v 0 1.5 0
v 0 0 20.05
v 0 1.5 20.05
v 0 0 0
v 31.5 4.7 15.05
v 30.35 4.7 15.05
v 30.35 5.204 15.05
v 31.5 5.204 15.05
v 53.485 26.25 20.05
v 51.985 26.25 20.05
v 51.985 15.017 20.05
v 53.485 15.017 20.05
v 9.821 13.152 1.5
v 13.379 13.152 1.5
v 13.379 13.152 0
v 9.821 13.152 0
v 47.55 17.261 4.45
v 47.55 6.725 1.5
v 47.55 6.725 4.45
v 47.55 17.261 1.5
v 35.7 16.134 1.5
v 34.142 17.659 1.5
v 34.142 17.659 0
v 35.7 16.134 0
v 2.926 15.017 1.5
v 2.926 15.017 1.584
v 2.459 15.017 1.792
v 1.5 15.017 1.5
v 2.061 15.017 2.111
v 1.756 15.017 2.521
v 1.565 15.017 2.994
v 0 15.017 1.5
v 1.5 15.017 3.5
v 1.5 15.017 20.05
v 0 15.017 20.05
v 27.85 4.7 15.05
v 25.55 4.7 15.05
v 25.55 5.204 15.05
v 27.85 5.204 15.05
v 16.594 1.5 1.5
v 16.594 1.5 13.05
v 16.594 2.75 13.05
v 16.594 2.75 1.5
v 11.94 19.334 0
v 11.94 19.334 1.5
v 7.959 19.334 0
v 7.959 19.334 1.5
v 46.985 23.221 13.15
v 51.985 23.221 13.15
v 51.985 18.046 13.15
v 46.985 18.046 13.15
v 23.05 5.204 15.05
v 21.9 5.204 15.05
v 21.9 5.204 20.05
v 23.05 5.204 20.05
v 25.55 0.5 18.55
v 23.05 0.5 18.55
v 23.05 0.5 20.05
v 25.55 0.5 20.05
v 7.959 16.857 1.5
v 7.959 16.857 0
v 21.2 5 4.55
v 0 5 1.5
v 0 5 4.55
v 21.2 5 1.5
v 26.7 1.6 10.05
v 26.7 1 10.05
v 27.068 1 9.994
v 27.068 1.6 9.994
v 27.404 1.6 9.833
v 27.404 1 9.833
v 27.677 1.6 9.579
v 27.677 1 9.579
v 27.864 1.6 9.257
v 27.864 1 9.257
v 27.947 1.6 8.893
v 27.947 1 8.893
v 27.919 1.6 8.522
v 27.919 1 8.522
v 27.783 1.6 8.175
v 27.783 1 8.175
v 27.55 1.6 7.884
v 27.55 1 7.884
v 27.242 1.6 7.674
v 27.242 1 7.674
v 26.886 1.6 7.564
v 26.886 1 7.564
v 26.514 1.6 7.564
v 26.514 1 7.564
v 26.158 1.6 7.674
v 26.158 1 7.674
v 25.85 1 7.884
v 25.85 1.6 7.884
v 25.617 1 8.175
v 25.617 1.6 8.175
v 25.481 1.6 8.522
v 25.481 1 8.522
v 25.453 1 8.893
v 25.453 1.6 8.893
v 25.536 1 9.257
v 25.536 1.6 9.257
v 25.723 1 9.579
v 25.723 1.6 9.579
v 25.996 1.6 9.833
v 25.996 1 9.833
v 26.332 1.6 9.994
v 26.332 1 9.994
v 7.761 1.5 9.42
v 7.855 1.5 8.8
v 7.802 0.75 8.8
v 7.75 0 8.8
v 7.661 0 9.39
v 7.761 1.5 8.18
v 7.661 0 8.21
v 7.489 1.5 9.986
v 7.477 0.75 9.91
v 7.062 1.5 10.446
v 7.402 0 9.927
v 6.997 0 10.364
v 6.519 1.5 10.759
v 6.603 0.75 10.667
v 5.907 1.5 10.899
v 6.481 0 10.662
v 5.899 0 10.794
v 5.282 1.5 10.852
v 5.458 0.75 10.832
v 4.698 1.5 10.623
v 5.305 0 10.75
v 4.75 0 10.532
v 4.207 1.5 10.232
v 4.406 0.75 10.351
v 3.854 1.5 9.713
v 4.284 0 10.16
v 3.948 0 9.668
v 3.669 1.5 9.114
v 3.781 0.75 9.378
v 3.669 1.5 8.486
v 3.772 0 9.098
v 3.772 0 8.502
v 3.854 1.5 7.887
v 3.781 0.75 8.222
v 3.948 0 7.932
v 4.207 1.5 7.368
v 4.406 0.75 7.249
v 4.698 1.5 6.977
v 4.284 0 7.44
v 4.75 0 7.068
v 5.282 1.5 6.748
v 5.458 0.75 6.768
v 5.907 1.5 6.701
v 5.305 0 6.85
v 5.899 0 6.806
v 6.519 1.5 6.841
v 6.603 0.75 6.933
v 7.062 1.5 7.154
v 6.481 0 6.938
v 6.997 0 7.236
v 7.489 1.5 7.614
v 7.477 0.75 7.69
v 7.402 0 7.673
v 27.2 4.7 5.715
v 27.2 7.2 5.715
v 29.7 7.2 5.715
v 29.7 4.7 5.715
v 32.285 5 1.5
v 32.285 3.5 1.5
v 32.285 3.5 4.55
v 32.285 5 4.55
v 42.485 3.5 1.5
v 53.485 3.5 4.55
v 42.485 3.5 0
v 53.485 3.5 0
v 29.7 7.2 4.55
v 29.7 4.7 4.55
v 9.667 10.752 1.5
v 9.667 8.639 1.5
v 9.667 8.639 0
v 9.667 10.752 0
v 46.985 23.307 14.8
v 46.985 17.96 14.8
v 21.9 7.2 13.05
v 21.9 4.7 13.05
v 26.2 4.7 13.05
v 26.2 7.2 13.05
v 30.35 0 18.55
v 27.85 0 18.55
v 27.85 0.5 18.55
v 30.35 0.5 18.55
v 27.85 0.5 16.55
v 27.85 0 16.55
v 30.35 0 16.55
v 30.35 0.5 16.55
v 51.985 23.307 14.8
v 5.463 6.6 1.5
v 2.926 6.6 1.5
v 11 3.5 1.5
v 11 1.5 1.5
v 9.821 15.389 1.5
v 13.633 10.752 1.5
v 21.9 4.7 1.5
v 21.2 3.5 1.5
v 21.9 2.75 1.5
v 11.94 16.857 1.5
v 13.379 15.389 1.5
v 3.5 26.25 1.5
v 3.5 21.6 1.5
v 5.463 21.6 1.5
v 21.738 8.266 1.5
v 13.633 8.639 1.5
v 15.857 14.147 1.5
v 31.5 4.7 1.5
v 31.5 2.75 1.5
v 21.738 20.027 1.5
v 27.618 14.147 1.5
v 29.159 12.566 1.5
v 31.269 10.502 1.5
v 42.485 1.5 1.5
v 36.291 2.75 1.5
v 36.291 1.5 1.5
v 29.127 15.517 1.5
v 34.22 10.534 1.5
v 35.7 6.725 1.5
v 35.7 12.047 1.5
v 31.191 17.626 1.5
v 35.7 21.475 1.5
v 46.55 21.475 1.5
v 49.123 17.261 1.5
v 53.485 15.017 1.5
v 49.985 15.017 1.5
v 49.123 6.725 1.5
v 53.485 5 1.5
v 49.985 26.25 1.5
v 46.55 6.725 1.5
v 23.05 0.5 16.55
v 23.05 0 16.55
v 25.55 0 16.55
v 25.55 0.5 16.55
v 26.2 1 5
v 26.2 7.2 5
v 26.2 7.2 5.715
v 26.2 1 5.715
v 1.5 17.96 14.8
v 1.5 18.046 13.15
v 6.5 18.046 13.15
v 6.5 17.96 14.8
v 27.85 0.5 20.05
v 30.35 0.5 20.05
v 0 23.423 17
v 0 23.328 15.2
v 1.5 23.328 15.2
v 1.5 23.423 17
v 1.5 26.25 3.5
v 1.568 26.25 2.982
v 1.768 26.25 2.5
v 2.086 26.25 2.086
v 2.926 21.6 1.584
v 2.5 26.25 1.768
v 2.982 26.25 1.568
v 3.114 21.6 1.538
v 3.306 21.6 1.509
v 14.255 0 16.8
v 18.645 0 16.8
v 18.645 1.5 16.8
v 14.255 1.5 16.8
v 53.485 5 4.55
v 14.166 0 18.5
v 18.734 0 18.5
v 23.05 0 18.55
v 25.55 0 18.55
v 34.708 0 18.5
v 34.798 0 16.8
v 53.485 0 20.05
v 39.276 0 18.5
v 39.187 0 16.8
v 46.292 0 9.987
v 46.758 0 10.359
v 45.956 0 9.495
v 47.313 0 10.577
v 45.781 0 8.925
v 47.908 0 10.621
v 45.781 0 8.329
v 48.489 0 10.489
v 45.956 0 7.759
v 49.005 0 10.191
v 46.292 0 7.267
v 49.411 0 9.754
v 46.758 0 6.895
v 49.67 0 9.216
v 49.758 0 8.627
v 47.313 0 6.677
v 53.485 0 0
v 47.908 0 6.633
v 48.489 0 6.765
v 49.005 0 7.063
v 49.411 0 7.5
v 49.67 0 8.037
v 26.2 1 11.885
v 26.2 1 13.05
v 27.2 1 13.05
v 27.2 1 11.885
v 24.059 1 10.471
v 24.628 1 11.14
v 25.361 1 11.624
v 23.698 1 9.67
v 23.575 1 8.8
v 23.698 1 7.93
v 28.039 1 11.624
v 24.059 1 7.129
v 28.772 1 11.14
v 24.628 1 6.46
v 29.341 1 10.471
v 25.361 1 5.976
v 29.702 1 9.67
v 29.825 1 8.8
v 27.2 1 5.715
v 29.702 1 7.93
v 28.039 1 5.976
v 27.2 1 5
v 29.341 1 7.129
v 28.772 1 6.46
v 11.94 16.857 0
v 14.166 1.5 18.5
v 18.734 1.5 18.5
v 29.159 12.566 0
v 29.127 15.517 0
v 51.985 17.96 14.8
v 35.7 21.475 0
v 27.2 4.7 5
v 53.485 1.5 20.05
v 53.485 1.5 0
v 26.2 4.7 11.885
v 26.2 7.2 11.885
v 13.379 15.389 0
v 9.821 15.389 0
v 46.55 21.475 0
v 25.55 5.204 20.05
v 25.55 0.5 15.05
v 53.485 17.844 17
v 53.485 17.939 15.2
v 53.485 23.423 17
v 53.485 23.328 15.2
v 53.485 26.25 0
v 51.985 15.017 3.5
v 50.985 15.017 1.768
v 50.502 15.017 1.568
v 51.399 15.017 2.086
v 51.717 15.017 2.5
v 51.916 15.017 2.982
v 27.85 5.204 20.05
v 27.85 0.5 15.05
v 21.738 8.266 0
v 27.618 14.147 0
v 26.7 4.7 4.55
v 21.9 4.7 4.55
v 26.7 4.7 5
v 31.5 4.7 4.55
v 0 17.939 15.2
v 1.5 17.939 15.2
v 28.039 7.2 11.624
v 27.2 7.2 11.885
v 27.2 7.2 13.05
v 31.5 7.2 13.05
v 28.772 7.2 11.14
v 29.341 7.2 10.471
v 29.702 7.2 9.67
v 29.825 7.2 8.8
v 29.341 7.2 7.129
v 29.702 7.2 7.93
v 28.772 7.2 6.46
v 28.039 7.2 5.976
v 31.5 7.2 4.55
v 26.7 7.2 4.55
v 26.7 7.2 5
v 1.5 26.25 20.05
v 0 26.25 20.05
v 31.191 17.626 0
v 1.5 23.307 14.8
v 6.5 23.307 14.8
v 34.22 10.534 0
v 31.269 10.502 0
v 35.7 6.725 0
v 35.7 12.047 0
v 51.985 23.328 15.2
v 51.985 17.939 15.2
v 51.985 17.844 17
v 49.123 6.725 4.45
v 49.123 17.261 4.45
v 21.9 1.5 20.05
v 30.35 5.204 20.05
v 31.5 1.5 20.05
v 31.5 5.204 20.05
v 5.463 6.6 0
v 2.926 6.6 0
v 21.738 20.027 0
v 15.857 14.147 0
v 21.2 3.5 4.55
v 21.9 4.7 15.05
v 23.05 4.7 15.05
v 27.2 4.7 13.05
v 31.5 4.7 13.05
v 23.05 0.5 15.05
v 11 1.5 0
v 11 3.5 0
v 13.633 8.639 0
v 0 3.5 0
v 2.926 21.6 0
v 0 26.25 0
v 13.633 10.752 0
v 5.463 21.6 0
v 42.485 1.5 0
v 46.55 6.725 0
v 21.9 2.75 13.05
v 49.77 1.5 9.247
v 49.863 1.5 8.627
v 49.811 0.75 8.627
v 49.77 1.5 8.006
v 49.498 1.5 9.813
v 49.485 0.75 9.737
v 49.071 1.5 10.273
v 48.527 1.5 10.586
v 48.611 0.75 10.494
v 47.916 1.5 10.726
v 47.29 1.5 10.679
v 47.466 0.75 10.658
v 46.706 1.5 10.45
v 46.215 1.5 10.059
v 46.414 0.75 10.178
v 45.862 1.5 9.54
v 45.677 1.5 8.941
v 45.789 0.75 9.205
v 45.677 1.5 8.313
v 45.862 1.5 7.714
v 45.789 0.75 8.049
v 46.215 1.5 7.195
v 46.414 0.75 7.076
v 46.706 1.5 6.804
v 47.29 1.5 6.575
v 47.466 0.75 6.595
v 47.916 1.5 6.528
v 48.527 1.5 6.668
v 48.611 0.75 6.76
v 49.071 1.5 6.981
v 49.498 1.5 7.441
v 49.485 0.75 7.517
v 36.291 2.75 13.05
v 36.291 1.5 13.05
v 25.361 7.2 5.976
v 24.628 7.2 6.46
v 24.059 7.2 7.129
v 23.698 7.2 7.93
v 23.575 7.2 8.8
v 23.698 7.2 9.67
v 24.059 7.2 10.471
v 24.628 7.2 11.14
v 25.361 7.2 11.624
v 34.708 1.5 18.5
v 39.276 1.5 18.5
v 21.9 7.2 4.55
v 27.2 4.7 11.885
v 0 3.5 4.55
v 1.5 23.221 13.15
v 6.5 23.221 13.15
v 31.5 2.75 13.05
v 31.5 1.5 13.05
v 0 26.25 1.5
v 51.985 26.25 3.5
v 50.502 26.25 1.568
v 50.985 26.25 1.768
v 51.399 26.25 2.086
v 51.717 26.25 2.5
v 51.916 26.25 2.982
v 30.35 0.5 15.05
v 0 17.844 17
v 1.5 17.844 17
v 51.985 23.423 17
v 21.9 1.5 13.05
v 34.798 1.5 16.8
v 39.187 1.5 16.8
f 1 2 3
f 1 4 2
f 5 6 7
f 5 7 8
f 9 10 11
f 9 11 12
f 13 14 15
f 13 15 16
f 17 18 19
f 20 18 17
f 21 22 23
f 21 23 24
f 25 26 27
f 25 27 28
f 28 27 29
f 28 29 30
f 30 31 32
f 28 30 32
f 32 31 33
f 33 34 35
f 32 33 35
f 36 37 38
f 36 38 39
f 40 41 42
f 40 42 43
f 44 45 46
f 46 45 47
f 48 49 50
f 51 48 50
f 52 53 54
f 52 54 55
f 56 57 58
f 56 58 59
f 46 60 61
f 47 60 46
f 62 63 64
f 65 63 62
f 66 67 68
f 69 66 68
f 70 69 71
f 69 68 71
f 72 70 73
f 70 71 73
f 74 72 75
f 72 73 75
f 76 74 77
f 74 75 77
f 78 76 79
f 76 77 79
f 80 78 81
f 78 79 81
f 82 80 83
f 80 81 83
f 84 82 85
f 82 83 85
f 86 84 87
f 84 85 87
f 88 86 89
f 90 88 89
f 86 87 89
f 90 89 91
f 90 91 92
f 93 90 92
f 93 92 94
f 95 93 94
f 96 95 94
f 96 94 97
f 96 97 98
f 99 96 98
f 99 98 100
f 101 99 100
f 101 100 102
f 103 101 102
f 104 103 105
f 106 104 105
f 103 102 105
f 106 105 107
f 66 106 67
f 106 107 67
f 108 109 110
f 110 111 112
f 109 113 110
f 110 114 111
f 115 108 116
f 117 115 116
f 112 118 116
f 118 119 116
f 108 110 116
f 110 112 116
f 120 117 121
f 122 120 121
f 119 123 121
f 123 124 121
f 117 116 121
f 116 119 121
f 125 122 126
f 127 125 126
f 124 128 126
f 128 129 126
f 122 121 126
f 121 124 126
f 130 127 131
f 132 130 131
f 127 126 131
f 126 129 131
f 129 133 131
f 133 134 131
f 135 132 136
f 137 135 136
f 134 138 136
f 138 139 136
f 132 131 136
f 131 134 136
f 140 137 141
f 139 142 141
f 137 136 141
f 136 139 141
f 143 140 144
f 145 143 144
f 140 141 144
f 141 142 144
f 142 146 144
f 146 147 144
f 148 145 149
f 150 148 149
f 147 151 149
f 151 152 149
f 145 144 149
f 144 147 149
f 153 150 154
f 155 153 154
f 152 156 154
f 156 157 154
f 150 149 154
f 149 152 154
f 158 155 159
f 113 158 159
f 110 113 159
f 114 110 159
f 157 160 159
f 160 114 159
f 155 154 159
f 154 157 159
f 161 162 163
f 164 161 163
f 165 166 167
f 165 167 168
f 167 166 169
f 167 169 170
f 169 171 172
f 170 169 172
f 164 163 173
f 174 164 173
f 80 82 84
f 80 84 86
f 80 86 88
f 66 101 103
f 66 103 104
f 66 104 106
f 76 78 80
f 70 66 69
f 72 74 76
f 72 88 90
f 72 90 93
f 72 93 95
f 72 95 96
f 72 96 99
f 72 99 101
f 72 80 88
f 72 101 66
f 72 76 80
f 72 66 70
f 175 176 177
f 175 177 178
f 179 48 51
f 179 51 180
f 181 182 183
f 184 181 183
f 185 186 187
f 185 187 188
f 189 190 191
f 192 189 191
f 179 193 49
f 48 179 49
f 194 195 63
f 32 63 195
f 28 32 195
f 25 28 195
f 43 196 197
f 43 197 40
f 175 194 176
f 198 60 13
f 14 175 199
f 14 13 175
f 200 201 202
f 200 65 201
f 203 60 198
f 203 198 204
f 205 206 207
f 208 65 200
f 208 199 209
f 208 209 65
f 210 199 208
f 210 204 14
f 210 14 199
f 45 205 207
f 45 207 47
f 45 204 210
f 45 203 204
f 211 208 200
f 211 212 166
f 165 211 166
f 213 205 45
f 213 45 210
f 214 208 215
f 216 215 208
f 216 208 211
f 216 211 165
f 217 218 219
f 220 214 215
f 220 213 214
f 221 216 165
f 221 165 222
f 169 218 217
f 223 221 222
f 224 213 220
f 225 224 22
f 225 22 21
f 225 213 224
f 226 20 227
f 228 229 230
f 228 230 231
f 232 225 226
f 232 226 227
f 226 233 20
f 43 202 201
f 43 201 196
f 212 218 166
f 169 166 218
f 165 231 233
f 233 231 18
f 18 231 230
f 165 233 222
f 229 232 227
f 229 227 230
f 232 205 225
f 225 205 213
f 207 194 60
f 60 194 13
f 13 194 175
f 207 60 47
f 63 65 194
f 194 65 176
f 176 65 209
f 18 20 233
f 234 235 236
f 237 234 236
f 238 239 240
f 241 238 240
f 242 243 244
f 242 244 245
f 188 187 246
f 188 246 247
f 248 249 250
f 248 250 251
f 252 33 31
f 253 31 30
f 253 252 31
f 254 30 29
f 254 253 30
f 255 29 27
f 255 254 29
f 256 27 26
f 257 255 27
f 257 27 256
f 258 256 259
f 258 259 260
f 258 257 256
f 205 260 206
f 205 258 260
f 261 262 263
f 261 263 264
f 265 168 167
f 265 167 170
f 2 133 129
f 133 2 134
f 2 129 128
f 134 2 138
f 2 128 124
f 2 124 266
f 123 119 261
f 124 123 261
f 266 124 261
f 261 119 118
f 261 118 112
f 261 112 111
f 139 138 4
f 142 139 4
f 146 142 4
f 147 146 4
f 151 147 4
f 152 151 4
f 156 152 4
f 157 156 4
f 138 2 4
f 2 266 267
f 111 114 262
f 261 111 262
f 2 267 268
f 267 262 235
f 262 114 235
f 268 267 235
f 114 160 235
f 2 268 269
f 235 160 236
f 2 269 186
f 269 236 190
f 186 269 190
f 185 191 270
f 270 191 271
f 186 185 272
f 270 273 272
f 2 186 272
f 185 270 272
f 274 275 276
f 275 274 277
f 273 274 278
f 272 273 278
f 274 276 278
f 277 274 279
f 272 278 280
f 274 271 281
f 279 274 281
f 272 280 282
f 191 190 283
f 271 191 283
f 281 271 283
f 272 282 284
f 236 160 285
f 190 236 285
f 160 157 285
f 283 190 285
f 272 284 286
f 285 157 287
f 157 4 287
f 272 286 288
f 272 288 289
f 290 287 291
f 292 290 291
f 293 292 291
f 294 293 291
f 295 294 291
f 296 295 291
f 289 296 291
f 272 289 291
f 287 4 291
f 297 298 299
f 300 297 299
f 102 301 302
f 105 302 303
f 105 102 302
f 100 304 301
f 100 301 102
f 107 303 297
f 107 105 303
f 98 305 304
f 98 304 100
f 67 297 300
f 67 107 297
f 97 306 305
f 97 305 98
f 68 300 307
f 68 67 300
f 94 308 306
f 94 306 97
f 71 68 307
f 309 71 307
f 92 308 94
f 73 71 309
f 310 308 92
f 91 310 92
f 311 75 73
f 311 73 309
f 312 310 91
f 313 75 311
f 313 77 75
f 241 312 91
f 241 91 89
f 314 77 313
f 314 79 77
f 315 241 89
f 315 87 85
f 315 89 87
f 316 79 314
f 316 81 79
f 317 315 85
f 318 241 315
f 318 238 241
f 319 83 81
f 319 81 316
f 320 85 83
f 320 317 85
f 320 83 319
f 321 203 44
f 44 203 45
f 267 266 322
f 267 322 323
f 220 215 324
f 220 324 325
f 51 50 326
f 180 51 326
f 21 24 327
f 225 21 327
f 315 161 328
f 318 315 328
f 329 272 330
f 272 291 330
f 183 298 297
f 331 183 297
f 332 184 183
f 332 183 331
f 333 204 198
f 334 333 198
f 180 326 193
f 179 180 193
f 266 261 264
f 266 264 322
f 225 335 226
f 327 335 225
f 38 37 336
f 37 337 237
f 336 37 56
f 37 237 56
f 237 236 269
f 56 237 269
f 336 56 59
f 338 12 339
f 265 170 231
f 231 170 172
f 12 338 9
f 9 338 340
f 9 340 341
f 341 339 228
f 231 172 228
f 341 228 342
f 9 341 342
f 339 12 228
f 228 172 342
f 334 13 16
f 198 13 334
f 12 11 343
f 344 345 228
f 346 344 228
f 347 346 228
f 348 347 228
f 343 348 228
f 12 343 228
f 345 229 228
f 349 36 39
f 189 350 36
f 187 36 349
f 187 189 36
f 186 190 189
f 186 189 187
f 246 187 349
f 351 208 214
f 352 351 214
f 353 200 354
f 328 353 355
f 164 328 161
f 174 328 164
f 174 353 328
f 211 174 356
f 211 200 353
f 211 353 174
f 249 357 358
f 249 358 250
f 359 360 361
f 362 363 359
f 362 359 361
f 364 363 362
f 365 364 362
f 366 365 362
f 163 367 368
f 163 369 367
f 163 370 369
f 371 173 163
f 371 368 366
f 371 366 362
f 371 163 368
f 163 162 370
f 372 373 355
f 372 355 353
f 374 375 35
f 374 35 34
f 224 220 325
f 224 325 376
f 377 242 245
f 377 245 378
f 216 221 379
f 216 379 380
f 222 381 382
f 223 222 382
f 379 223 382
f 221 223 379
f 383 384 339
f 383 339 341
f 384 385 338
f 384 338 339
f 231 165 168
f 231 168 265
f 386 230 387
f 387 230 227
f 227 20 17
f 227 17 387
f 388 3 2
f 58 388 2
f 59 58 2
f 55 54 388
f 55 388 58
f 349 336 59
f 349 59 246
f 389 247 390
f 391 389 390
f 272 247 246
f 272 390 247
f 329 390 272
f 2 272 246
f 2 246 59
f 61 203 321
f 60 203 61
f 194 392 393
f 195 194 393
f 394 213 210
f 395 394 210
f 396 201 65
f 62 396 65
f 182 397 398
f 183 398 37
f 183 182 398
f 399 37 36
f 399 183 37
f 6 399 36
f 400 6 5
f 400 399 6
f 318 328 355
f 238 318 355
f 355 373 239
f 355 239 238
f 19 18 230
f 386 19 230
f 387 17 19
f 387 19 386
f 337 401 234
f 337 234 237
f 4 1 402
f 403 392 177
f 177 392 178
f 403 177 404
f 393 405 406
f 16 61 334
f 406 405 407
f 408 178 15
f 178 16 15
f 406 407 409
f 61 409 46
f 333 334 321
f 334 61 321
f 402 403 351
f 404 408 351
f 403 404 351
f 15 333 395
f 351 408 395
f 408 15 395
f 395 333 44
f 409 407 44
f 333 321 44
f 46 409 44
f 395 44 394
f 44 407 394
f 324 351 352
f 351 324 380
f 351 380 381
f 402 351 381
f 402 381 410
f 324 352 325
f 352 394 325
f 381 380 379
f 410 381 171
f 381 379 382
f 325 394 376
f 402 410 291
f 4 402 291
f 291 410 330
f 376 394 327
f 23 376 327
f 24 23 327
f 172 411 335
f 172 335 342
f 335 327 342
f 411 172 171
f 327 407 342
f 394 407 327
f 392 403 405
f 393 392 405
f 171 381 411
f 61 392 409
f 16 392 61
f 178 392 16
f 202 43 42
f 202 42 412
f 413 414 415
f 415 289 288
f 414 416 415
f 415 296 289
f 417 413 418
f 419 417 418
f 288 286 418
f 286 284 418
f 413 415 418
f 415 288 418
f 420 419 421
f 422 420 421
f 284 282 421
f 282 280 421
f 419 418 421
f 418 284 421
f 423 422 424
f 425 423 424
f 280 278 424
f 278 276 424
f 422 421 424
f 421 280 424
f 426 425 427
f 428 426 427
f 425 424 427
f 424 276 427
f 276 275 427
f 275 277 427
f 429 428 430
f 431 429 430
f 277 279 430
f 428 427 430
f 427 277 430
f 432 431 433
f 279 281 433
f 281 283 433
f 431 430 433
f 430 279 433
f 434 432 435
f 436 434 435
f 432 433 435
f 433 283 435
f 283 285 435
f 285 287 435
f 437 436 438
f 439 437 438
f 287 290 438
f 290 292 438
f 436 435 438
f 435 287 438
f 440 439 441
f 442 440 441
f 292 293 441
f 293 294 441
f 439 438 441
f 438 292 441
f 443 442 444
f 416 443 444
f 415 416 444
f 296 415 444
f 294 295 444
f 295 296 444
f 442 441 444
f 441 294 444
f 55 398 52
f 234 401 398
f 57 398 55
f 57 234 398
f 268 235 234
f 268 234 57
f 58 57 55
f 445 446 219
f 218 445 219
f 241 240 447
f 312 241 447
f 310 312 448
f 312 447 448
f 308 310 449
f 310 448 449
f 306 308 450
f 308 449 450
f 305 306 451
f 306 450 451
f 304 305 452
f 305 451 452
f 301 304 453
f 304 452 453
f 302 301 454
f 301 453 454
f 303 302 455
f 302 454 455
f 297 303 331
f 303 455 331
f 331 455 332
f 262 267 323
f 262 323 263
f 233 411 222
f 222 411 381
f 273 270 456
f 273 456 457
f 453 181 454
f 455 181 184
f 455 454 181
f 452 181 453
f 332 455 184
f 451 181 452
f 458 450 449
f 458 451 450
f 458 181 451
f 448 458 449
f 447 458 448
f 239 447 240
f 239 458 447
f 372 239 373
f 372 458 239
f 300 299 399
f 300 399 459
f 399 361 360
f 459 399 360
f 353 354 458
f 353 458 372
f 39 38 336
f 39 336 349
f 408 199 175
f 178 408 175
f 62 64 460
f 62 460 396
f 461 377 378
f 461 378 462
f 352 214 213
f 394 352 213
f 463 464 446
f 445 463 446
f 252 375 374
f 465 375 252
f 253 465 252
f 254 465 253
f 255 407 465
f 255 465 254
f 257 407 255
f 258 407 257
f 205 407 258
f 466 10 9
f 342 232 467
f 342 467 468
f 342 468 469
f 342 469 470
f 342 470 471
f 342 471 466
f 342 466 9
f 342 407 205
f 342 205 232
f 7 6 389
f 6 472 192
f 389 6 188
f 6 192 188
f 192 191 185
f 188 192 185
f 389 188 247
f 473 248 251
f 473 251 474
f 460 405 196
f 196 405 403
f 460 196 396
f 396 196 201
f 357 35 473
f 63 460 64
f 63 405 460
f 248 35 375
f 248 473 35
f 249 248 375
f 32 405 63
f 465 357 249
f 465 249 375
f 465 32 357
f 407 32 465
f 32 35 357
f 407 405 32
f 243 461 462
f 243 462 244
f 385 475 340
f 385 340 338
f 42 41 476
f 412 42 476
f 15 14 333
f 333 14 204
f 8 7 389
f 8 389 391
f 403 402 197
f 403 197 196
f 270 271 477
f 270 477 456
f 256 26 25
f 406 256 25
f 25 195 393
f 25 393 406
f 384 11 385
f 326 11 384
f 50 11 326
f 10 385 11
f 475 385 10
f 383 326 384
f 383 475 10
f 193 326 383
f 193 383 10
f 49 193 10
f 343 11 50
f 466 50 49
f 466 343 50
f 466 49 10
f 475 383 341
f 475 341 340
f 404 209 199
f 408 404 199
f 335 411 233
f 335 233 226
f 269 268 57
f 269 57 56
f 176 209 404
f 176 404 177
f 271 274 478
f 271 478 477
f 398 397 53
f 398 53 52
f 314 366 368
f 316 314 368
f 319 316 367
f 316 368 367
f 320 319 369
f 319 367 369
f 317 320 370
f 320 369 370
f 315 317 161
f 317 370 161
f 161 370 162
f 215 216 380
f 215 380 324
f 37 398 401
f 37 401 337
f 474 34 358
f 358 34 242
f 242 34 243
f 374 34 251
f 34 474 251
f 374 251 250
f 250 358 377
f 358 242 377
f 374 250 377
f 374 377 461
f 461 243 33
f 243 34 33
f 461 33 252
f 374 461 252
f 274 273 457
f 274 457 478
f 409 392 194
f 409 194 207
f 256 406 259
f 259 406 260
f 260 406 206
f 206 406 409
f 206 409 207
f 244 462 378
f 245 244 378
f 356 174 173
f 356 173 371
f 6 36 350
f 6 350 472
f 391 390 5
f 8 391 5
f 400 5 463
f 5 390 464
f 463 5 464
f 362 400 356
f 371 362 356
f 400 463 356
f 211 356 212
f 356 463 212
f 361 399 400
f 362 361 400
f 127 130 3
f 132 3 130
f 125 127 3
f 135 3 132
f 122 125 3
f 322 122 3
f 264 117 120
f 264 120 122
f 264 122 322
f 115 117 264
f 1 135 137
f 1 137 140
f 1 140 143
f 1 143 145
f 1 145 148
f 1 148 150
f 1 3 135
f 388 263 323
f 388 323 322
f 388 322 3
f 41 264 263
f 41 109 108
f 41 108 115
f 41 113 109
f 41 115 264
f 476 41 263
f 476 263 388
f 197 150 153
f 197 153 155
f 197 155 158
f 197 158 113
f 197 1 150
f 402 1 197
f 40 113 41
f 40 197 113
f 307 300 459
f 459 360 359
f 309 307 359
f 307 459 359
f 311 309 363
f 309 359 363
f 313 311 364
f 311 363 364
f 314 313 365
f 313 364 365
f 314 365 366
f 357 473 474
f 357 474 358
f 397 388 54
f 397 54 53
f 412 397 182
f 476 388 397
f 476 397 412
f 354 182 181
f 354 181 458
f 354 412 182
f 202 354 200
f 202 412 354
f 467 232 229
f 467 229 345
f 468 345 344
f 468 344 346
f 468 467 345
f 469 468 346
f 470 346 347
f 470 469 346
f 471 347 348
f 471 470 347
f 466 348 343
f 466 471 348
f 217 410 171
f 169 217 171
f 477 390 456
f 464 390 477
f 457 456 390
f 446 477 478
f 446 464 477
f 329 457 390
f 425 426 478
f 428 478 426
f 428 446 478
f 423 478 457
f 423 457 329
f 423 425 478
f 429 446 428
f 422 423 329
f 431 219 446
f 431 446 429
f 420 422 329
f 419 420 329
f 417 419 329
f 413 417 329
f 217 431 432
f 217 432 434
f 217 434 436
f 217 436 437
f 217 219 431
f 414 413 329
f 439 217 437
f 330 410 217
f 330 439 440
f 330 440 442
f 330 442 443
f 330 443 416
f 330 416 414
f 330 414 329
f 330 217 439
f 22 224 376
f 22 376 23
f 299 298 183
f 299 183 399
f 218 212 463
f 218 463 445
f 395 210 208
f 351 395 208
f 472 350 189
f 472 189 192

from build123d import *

# Parameters (mm, degrees)
SKETCH1_W                              = 53.48460998
SKETCH1_H                              = 26.25
FRONT_SIDE_MAIN_DEPTH                  = 1.5
RESET_HOLE_DEPTH                       = 3.75
SKETCH15_W                             = 3.966010581
SKETCH15_H                             = 2.112155191
SKETCH15_W_2                           = 3.557190409
SKETCH15_H_2                           = 2.236587576
SKETCH15_W_3                           = 3.981127105
SKETCH15_H_3                           = 2.476855865
COMPONENT_HOLES_DEPTH                  = 3.75
SKETCH16_W                             = 10.85
SKETCH16_H                             = 14.75
MICROPHONE_HOLE_DEPTH                  = 1.5
SKETCH24_W                             = 1.5
SKETCH24_H                             = 11.233042059
RIGHT_SIDE_TOP_DEPTH                   = 18.55
SNAP_GROOVE_RIGHT_DEPTH                = 1.5
SKETCH26_W                             = 1.5
SKETCH26_H                             = 11.23304206
LEFT_SIDE_TOP_DEPTH                    = 18.55
SNAP_START                             = 51.98460998
SNAP_GROOVE_LEFT_DEPTH                 = 1.5
SKETCH20_W                             = 53.48460998
SKETCH20_H                             = 1.5
BOTTOM_BASE_DEPTH                      = 18.55
SERVO_START                            = -1.5
SKETCH18_W                             = 9.6
SKETCH18_H                             = 3.2
SERVO_SEPERATOR_BOTTOM_DEPTH           = 20.05
SKETCH34_W                             = 2.537171882
SKETCH34_H                             = 15
PROGRAMMING_HOLE_DEPTH                 = 3.75
SKETCH38_W                             = 9.6
SKETCH38_H                             = 5
BACK_BATTERY_HOLDER_BOTTOM_DEPTH       = 0.50445794
SKETCH40_R                             = 2
SERVO_ARM_HOLES_BOTTOM_DEPTH           = 1.5
SERVO_ARM_HOLES_BOTTOM_DRAFT           = 4
SERVO_ARM_HOLES_BOTTOM_PROFILE_2_DEPTH = 1.5
SERVO_ARM_HOLES_BOTTOM_PROFILE_2_DRAFT = 4
SKETCH47_W                             = 11
SKETCH47_H                             = 2
SOLAR_ARM_HOLES_FRONT_DEPTH            = 1.5
FILLET1_R                              = 2
SKETCH48_W                             = 9.6
SKETCH48_H                             = 8.5
SERVO_TALLER_SEPERATOR_BOTTOM_DEPTH    = 2.5
SKETCH49_W                             = 1.573389805
SKETCH49_H                             = 10.535992885
SERVO_2_CASE_SPACER_FRONT_DEPTH        = 2.95
SKETCH51_W                             = 4.791370676
SKETCH51_H                             = 11.55
SKETCH51_W_2                           = 5.306259021
SERVO_LIFTERS_BOTTOM_DEPTH             = 1.25
SKETCH52_W                             = 21.2
SKETCH52_H                             = 1.5
SERVO_UNDER_SUPPORT_DEPTH              = 3.05
SERVO_TOP_SUPPORT_RIGHT_DEPTH          = 5
SERVO_TOP_SUPPORT_LEFT_DEPTH           = 5
SNAP_GROOVE_BOTTOM_RIGHT_DEPTH         = 1.5
SNAP_GROOVE_BOTTOM_LEFT_DEPTH          = 1.5
VIBRATION_MOTOR_AND_WIRE_HOLES_DEPTH   = 6.2
SKETCH57_W                             = 3
SKETCH57_H                             = 1.16525933
SKETCH57_W_2                           = 1
SKETCH57_H_2                           = 1.45
VIBRATION_WIRE_ROUTING_HOLES_DEPTH     = 2.5
SKETCH60_W                             = 2.5
SKETCH60_H                             = 5
COPPER_HOLES_DEPTH                     = 4.70445794
SKETCH61_W                             = 2.5
SKETCH61_H                             = 2
CUT_EXTRUDE5_DEPTH                     = 0.5
SKETCH62_R                             = 1.25
BOSS_EXTRUDE1_DEPTH                    = 0.6
CUT_EXTRUDE7_START                     = -3.7
CUT_EXTRUDE7_DEPTH                     = 3.7


# Read off the part's stored shape, not the designer's step: Snap Groove - Right, Snap Groove - Left, Snap Groove - Bottom Right, Snap Groove - Bottom Left, Cut-Extrude7
with BuildPart() as part:
    # Sketch1 → Front Side - Main (new body)
    with BuildSketch(Plane.XY):
        with Locations((26.74230499, 13.125)):
            Rectangle(SKETCH1_W, SKETCH1_H)
    extrude(amount=FRONT_SIDE_MAIN_DEPTH)

    # Reset Hole Sketch → Reset Hole (cut)
    with BuildSketch(Plane(origin=(0, 0, 3.75), x_dir=(-1, 0, 0), z_dir=(0, 0, -1))):
        Polygon((-31.190735744, 17.626168756), (-34.141748042, 17.658585925), (-36.251351249, 15.594827519), (-36.283768419, 12.643815222), (-34.220010013, 10.534212015), (-31.268997715, 10.501794845), (-29.159394508, 12.565553251), (-29.126977338, 15.516565548), align=None)
    extrude(amount=RESET_HOLE_DEPTH, mode=Mode.SUBTRACT)

    # Sketch15 → Component Holes (cut)
    with BuildSketch(Plane(origin=(0, 0, 3.75), x_dir=(-1, 0, 0), z_dir=(0, 0, -1))):
        Polygon((-21.737702993, 20.027277789), (-15.857179586, 14.146754382), (-21.737702993, 8.266230975), (-27.6182264, 14.146754382), align=None)
        with Locations((-11.649935563, 9.695513201)):
            Rectangle(SKETCH15_W, SKETCH15_H)
        with Locations((-11.599935563, 14.270513201)):
            Rectangle(SKETCH15_W_2, SKETCH15_H_2)
        with Locations((-9.949935563, 18.095513201)):
            Rectangle(SKETCH15_W_3, SKETCH15_H_3)
    extrude(amount=COMPONENT_HOLES_DEPTH, mode=Mode.SUBTRACT)

    # Sketch16 → Microphone Hole (cut)
    with BuildSketch(Plane(origin=(0, 0, 0), x_dir=(-1, 0, 0), z_dir=(0, 0, -1))):
        with Locations((-41.124935562, 14.1)):
            Rectangle(SKETCH16_W, SKETCH16_H)
    extrude(amount=-MICROPHONE_HOLE_DEPTH, mode=Mode.SUBTRACT)

    # Sketch24 → Right Side - Top (add)
    with BuildSketch(Plane.XY.offset(1.5)):
        with Locations((0.75, 20.633478971)):
            Rectangle(SKETCH24_W, SKETCH24_H)
    extrude(amount=RIGHT_SIDE_TOP_DEPTH)

    # Snap Groove - Right outline → Snap Groove - Right (cut)
    with BuildSketch(Plane.YZ):
        Polygon((17.938719749, 15.2), (23.328238193, 15.2), (23.422572195, 17), (17.844385746, 17), align=None)
    extrude(amount=SNAP_GROOVE_RIGHT_DEPTH, mode=Mode.SUBTRACT)

    # Sketch26 → Left Side - Top (add)
    with BuildSketch(Plane.XY.offset(1.5)):
        with Locations((52.73460998, 20.63347897)):
            Rectangle(SKETCH26_W, SKETCH26_H)
    extrude(amount=LEFT_SIDE_TOP_DEPTH)

    # Snap Groove - Left outline → Snap Groove - Left (cut)
    with BuildSketch(Plane.YZ.offset(SNAP_START)):
        Polygon((17.938719748, 15.2), (23.328238192, 15.2), (23.422572195, 17), (17.844385746, 17), align=None)
    extrude(amount=SNAP_GROOVE_LEFT_DEPTH, mode=Mode.SUBTRACT)

    # Sketch18 → Servo Seperator - Bottom (add)
    with BuildSketch(Plane.XY.offset(1.5).offset(SERVO_START)):
        with Locations((26.7, 3.1)):
            Rectangle(SKETCH18_W, SKETCH18_H)
    extrude(amount=SERVO_SEPERATOR_BOTTOM_DEPTH)

    # Sketch34 → Programming Hole (cut)
    with BuildSketch(Plane(origin=(0, 0, 0), x_dir=(-1, 0, 0), z_dir=(0, 0, -1))):
        with Locations((-4.194161079, 14.100049249)):
            Rectangle(SKETCH34_W, SKETCH34_H)
    extrude(amount=-PROGRAMMING_HOLE_DEPTH, mode=Mode.SUBTRACT)

    # Sketch38 → Back Battery Holder - Bottom (add)
    with BuildSketch(Plane(origin=(0, 4.7, 0), x_dir=(1, 0, 0), z_dir=(0, 1, 0))):
        with Locations((26.7, -17.55)):
            Rectangle(SKETCH38_W, SKETCH38_H)
    extrude(amount=BACK_BATTERY_HOLDER_BOTTOM_DEPTH)

    # Sketch47 → Solar Arm Holes - Front (cut)
    with BuildSketch(Plane(origin=(0, 0, 0), x_dir=(-1, 0, 0), z_dir=(0, 0, -1))):
        with Locations((-47.98460998, 2.5)):
            Rectangle(SKETCH47_W, SKETCH47_H)
        with Locations((-5.5, 2.5)):
            Rectangle(SKETCH47_W, SKETCH47_H)
    extrude(amount=-SOLAR_ARM_HOLES_FRONT_DEPTH, mode=Mode.SUBTRACT)

    # Fillet1
    # the kernel refuses this fillet: 2 mm, written as the material it adds along each edge
    with BuildSketch(Plane(origin=(1.5, 26.25, 1.5), x_dir=(1, 0, 0), z_dir=(0, -1, 0))) as fillet1_piece_1_section:
        with BuildLine():
            CenterArc((FILLET1_R, FILLET1_R), FILLET1_R, 180, 90)
            Line((0, FILLET1_R), (0, 0))
            Line((0, 0), (FILLET1_R, 0))
        make_face()
    fillet1_piece_1 = extrude(amount=11.233042059, mode=Mode.PRIVATE)
    fillet1_piece_1 = split(fillet1_piece_1, bisect_by=Plane(origin=(3.153594052, 21.600049249, 1.498546269), z_dir=(0, 1, 0)), keep=Keep.TOP, mode=Mode.PRIVATE)
    fillet1_piece_1 = split(fillet1_piece_1, bisect_by=Plane(origin=(2.925575138, 23.925024625, 1.498546269), z_dir=(1, 0, 0)), keep=Keep.TOP, mode=Mode.PRIVATE)
    add(fillet1_piece_1)
    with BuildSketch(Plane(origin=(1.5, 26.25, 1.5), x_dir=(1, 0, 0), z_dir=(0, -1, 0))) as fillet1_piece_2_section:
        with BuildLine():
            CenterArc((FILLET1_R, FILLET1_R), FILLET1_R, 180, 90)
            Line((0, FILLET1_R), (0, 0))
            Line((0, 0), (FILLET1_R, 0))
        make_face()
    fillet1_piece_2 = extrude(amount=11.233042059, mode=Mode.PRIVATE)
    fillet1_piece_2 = split(fillet1_piece_2, bisect_by=Plane(origin=(1.90508607, 21.600049249, 1.970835912), z_dir=(0, 1, 0)), keep=Keep.TOP, mode=Mode.PRIVATE)
    fillet1_piece_2 = split(fillet1_piece_2, bisect_by=Plane(origin=(2.925575138, 23.925024625, 1.970835912), z_dir=(-1, 0, 0)), keep=Keep.TOP, mode=Mode.PRIVATE)
    add(fillet1_piece_2)
    with BuildSketch(Plane(origin=(1.5, 26.25, 1.5), x_dir=(1, 0, 0), z_dir=(0, -1, 0))) as fillet1_piece_3_section:
        with BuildLine():
            CenterArc((FILLET1_R, FILLET1_R), FILLET1_R, 180, 90)
            Line((0, FILLET1_R), (0, 0))
            Line((0, 0), (FILLET1_R, 0))
        make_face()
    fillet1_piece_3 = extrude(amount=11.233042059, mode=Mode.PRIVATE)
    fillet1_piece_3 = split(fillet1_piece_3, bisect_by=Plane(origin=(1.90508607, 21.600049249, 1.970835912), z_dir=(0, -1, 0)), keep=Keep.TOP, mode=Mode.PRIVATE)
    fillet1_piece_3 = split(fillet1_piece_3, bisect_by=Plane(origin=(2.925575138, 18.308503595, 1.970835912), z_dir=(-1, 0, 0)), keep=Keep.TOP, mode=Mode.PRIVATE)
    add(fillet1_piece_3)
    with BuildSketch(Plane(origin=(51.98460998, 26.25, 1.5), x_dir=(-1, 0, 0), z_dir=(0, -1, 0))) as fillet1_piece_4:
        with BuildLine():
            CenterArc((FILLET1_R, -FILLET1_R), FILLET1_R, 90, 90)
            Line((0, -FILLET1_R), (0, 0))
            Line((0, 0), (FILLET1_R, 0))
        make_face()
    extrude(amount=11.23304206)

    # Sketch48 → Servo Taller Seperator - Bottom (add)
    with BuildSketch(Plane(origin=(0, 4.7, 0), x_dir=(1, 0, 0), z_dir=(0, 1, 0))):
        with Locations((26.7, -8.8)):
            Rectangle(SKETCH48_W, SKETCH48_H)
    extrude(amount=SERVO_TALLER_SEPERATOR_BOTTOM_DEPTH)

    # Sketch49 → Servo 2 Case Spacer - Front (add)
    with BuildSketch(Plane.XY.offset(1.5)):
        with Locations((48.336630465, 11.992996443)):
            Rectangle(SKETCH49_W, SKETCH49_H)
    extrude(amount=SERVO_2_CASE_SPACER_FRONT_DEPTH)

    # Sketch51 → Servo Lifters - Bottom (add)
    with BuildSketch(Plane(origin=(0, 1.5, 0), x_dir=(1, 0, 0), z_dir=(0, 1, 0))):
        with Locations((33.895685338, -7.275)):
            Rectangle(SKETCH51_W, SKETCH51_H)
        with Locations((19.24687049, -7.275)):
            Rectangle(SKETCH51_W_2, SKETCH51_H)
    extrude(amount=SERVO_LIFTERS_BOTTOM_DEPTH)

    # Sketch52 → Servo Under Support (add)
    with BuildSketch(Plane.XY.offset(1.5)):
        with Locations((10.6, 4.25)):
            Rectangle(SKETCH52_W, SKETCH52_H)
        with Locations((42.88460998, 4.25)):
            Rectangle(SKETCH52_W, SKETCH52_H)
    extrude(amount=SERVO_UNDER_SUPPORT_DEPTH)

    # Sketch53 → Servo Top Support - Right (add)
    with BuildSketch(Plane(origin=(1.5, 0, 0), x_dir=(0, 0, -1), z_dir=(1, 0, 0))):
        Polygon((-14.8, 23.307275081), (-13.15, 23.220802245), (-13.15, 18.046155696), (-14.8, 17.95968286), align=None)
    extrude(amount=SERVO_TOP_SUPPORT_RIGHT_DEPTH)

    # Sketch55 → Servo Top Support - Left (add)
    with BuildSketch(Plane.ZY.offset(-51.98460998)):
        Polygon((14.8, 17.95968286), (14.8, 23.307275081), (13.15, 23.220802245), (13.15, 18.046155696), align=None)
    extrude(amount=SERVO_TOP_SUPPORT_LEFT_DEPTH)


with BuildPart() as body_2:
    # Sketch20 → Bottom Base (new body)
    with BuildSketch(Plane.XY.offset(1.5)):
        with Locations((26.74230499, 0.75)):
            Rectangle(SKETCH20_W, SKETCH20_H)
    extrude(amount=BOTTOM_BASE_DEPTH)


with BuildPart() as servo_arm_holes_bottom_tool:
    # Sketch40 → Servo arm Holes - Bottom (with draft: the straight prism first)
    with BuildSketch(Plane.XZ):
        with Locations((47.75839301, 8.62692576)):
            Circle(SKETCH40_R)
    extrude(amount=-SERVO_ARM_HOLES_BOTTOM_DEPTH)
    # Servo arm Holes - Bottom: the draft: its side faces are tilted about the plane it starts from
    servo_arm_holes_bottom_sides = [servo_arm_holes_bottom_tool.faces().sort_by_distance(p)[0] for p in [
        (45.75839301, 0.75, 8.62692576),
    ]]
    draft(servo_arm_holes_bottom_sides, Plane.XZ, SERVO_ARM_HOLES_BOTTOM_DRAFT)


with BuildPart() as body_2_1:
    add(body_2.part)

    # Servo arm Holes - Bottom: cut by servo_arm_holes_bottom_tool
    add(servo_arm_holes_bottom_tool.part, mode=Mode.SUBTRACT)


with BuildPart() as servo_arm_holes_bottom_profile_2_tool:
    # Sketch40 → Servo arm Holes - Bottom profile 2 (with draft: the straight prism first)
    with BuildSketch(Plane.XZ):
        with Locations((5.75, 8.8)):
            Circle(SKETCH40_R)
    extrude(amount=-SERVO_ARM_HOLES_BOTTOM_PROFILE_2_DEPTH)
    # Servo arm Holes - Bottom profile 2: the draft: its side faces are tilted about the plane it starts from
    servo_arm_holes_bottom_profile_2_sides = [servo_arm_holes_bottom_profile_2_tool.faces().sort_by_distance(p)[0] for p in [
        (3.75, 0.75, 8.8),
    ]]
    draft(servo_arm_holes_bottom_profile_2_sides, Plane.XZ, SERVO_ARM_HOLES_BOTTOM_PROFILE_2_DRAFT)


with BuildPart() as body_2_2:
    add(body_2_1.part)

    # Servo arm Holes - Bottom profile 2: cut by servo_arm_holes_bottom_profile_2_tool
    add(servo_arm_holes_bottom_profile_2_tool.part, mode=Mode.SUBTRACT)

    # Snap Groove - Bottom Right outline → Snap Groove - Bottom Right (cut)
    with BuildSketch(Plane(origin=(0, 0, 0), x_dir=(1, 0, 0), z_dir=(0, 1, 0))):
        Polygon((18.644759222, -16.8), (14.255240778, -16.8), (14.166147553, -18.5), (18.733852447, -18.5), align=None)
    extrude(amount=SNAP_GROOVE_BOTTOM_RIGHT_DEPTH, mode=Mode.SUBTRACT)

    # Snap Groove - Bottom Left outline → Snap Groove - Bottom Left (cut)
    with BuildSketch(Plane(origin=(0, 0, 0), x_dir=(1, 0, 0), z_dir=(0, 1, 0))):
        Polygon((39.276157437, -18.5), (39.187064212, -16.8), (34.797545768, -16.8), (34.708452543, -18.5), align=None)
    extrude(amount=SNAP_GROOVE_BOTTOM_LEFT_DEPTH, mode=Mode.SUBTRACT)


with BuildPart() as vibration_motor_and_wire_holes_tool:
    # Sketch56 → vibration motor and wire holes (new body)
    with BuildSketch(Plane(origin=(0, 7.2, 0), x_dir=(1, 0, 0), z_dir=(0, 1, 0))):
        with BuildLine():
            ThreePointArc((27.2, -5.71525933), (26.7, -5.675), (26.2, -5.71525933))
            Line((26.2, -5.71525933), (26.2, -6))
            Line((26.2, -6), (27.2, -6))
            Line((27.2, -6), (27.2, -5.71525933))
        make_face()
        with BuildLine():
            Line((26.2, -6), (26.2, -5.71525933))
            ThreePointArc((26.2, -5.71525933), (24.674768532, -11.179929096), (29.825, -8.8))
            ThreePointArc((29.825, -8.8), (29.079929096, -6.774768532), (27.2, -5.71525933))
            Line((27.2, -5.71525933), (27.2, -6))
            Line((27.2, -6), (26.2, -6))
        make_face()
        with BuildLine():
            Line((27.2, -5), (26.2, -5))
            Line((26.2, -5), (26.2, -5.71525933))
            ThreePointArc((26.2, -5.71525933), (26.7, -5.675), (27.2, -5.71525933))
            Line((27.2, -5.71525933), (27.2, -5))
        make_face()
    extrude(amount=-VIBRATION_MOTOR_AND_WIRE_HOLES_DEPTH)


with BuildPart() as part_1:
    add(part.part)

    # vibration motor and wire holes: cut by vibration_motor_and_wire_holes_tool
    add(vibration_motor_and_wire_holes_tool.part, mode=Mode.SUBTRACT)

    # Sketch57 → vibration wire routing holes (cut)
    with BuildSketch(Plane(origin=(0, 7.2, 0), x_dir=(1, 0, 0), z_dir=(0, 1, 0))):
        with Locations((28.2, -5.132629665)):
            Rectangle(SKETCH57_W, SKETCH57_H)
        with Locations((26.7, -12.325)):
            Rectangle(SKETCH57_W_2, SKETCH57_H_2)
    extrude(amount=-VIBRATION_WIRE_ROUTING_HOLES_DEPTH, mode=Mode.SUBTRACT)


with BuildPart() as body_2_3:
    add(body_2_2.part)

    # vibration motor and wire holes: cut by vibration_motor_and_wire_holes_tool
    add(vibration_motor_and_wire_holes_tool.part, mode=Mode.SUBTRACT)


with BuildPart() as copper_holes_tool:
    # Sketch60 → copper holes (new body)
    with BuildSketch(Plane(origin=(0, 5.20445794, 0), x_dir=(1, 0, 0), z_dir=(0, 1, 0))):
        with Locations((24.3, -17.55)):
            Rectangle(SKETCH60_W, SKETCH60_H)
        with Locations((29.1, -17.55)):
            Rectangle(SKETCH60_W, SKETCH60_H)
    extrude(amount=-COPPER_HOLES_DEPTH)


with BuildPart() as part_2:
    add(part_1.part)

    # copper holes: cut by copper_holes_tool
    add(copper_holes_tool.part, mode=Mode.SUBTRACT)



with BuildPart() as body_2_4:
    add(body_2_3.part)

    # copper holes: cut by copper_holes_tool
    add(copper_holes_tool.part, mode=Mode.SUBTRACT)

    # Sketch61 → Cut-Extrude5 (cut)
    with BuildSketch(Plane.XZ):
        with Locations((24.3, 17.55)):
            Rectangle(SKETCH61_W, SKETCH61_H)
        with Locations((29.1, 17.55)):
            Rectangle(SKETCH61_W, SKETCH61_H)
    extrude(amount=-CUT_EXTRUDE5_DEPTH, mode=Mode.SUBTRACT)


with BuildPart() as part_3:
    add(part_2.part)

    add(body_2_4.part)  # Boss-Extrude1 merges body 2
    # Sketch62 → Boss-Extrude1 (add)
    with BuildSketch(Plane(origin=(0, 1, 0), x_dir=(1, 0, 0), z_dir=(0, 1, 0))):
        with Locations(Location((26.7, -8.8, 0), (0, 0, 270))):
            Circle(SKETCH62_R)
    extrude(amount=BOSS_EXTRUDE1_DEPTH)

    # Cut-Extrude7 outline → Cut-Extrude7 (cut)
    with BuildSketch(Plane(origin=(0, 4.7, 0), x_dir=(1, 0, 0), z_dir=(0, 1, 0)).offset(CUT_EXTRUDE7_START)):
        with BuildLine():
            Line((26.2, -13.05), (27.2, -13.05))
            Line((27.2, -13.05), (27.2, -11.88474067))
            ThreePointArc((27.2, -11.88474067), (26.7, -11.925), (26.2, -11.88474067))
            Line((26.2, -11.88474067), (26.2, -13.05))
        make_face()
    extrude(amount=CUT_EXTRUDE7_DEPTH, mode=Mode.SUBTRACT)


solid = part_3.part
